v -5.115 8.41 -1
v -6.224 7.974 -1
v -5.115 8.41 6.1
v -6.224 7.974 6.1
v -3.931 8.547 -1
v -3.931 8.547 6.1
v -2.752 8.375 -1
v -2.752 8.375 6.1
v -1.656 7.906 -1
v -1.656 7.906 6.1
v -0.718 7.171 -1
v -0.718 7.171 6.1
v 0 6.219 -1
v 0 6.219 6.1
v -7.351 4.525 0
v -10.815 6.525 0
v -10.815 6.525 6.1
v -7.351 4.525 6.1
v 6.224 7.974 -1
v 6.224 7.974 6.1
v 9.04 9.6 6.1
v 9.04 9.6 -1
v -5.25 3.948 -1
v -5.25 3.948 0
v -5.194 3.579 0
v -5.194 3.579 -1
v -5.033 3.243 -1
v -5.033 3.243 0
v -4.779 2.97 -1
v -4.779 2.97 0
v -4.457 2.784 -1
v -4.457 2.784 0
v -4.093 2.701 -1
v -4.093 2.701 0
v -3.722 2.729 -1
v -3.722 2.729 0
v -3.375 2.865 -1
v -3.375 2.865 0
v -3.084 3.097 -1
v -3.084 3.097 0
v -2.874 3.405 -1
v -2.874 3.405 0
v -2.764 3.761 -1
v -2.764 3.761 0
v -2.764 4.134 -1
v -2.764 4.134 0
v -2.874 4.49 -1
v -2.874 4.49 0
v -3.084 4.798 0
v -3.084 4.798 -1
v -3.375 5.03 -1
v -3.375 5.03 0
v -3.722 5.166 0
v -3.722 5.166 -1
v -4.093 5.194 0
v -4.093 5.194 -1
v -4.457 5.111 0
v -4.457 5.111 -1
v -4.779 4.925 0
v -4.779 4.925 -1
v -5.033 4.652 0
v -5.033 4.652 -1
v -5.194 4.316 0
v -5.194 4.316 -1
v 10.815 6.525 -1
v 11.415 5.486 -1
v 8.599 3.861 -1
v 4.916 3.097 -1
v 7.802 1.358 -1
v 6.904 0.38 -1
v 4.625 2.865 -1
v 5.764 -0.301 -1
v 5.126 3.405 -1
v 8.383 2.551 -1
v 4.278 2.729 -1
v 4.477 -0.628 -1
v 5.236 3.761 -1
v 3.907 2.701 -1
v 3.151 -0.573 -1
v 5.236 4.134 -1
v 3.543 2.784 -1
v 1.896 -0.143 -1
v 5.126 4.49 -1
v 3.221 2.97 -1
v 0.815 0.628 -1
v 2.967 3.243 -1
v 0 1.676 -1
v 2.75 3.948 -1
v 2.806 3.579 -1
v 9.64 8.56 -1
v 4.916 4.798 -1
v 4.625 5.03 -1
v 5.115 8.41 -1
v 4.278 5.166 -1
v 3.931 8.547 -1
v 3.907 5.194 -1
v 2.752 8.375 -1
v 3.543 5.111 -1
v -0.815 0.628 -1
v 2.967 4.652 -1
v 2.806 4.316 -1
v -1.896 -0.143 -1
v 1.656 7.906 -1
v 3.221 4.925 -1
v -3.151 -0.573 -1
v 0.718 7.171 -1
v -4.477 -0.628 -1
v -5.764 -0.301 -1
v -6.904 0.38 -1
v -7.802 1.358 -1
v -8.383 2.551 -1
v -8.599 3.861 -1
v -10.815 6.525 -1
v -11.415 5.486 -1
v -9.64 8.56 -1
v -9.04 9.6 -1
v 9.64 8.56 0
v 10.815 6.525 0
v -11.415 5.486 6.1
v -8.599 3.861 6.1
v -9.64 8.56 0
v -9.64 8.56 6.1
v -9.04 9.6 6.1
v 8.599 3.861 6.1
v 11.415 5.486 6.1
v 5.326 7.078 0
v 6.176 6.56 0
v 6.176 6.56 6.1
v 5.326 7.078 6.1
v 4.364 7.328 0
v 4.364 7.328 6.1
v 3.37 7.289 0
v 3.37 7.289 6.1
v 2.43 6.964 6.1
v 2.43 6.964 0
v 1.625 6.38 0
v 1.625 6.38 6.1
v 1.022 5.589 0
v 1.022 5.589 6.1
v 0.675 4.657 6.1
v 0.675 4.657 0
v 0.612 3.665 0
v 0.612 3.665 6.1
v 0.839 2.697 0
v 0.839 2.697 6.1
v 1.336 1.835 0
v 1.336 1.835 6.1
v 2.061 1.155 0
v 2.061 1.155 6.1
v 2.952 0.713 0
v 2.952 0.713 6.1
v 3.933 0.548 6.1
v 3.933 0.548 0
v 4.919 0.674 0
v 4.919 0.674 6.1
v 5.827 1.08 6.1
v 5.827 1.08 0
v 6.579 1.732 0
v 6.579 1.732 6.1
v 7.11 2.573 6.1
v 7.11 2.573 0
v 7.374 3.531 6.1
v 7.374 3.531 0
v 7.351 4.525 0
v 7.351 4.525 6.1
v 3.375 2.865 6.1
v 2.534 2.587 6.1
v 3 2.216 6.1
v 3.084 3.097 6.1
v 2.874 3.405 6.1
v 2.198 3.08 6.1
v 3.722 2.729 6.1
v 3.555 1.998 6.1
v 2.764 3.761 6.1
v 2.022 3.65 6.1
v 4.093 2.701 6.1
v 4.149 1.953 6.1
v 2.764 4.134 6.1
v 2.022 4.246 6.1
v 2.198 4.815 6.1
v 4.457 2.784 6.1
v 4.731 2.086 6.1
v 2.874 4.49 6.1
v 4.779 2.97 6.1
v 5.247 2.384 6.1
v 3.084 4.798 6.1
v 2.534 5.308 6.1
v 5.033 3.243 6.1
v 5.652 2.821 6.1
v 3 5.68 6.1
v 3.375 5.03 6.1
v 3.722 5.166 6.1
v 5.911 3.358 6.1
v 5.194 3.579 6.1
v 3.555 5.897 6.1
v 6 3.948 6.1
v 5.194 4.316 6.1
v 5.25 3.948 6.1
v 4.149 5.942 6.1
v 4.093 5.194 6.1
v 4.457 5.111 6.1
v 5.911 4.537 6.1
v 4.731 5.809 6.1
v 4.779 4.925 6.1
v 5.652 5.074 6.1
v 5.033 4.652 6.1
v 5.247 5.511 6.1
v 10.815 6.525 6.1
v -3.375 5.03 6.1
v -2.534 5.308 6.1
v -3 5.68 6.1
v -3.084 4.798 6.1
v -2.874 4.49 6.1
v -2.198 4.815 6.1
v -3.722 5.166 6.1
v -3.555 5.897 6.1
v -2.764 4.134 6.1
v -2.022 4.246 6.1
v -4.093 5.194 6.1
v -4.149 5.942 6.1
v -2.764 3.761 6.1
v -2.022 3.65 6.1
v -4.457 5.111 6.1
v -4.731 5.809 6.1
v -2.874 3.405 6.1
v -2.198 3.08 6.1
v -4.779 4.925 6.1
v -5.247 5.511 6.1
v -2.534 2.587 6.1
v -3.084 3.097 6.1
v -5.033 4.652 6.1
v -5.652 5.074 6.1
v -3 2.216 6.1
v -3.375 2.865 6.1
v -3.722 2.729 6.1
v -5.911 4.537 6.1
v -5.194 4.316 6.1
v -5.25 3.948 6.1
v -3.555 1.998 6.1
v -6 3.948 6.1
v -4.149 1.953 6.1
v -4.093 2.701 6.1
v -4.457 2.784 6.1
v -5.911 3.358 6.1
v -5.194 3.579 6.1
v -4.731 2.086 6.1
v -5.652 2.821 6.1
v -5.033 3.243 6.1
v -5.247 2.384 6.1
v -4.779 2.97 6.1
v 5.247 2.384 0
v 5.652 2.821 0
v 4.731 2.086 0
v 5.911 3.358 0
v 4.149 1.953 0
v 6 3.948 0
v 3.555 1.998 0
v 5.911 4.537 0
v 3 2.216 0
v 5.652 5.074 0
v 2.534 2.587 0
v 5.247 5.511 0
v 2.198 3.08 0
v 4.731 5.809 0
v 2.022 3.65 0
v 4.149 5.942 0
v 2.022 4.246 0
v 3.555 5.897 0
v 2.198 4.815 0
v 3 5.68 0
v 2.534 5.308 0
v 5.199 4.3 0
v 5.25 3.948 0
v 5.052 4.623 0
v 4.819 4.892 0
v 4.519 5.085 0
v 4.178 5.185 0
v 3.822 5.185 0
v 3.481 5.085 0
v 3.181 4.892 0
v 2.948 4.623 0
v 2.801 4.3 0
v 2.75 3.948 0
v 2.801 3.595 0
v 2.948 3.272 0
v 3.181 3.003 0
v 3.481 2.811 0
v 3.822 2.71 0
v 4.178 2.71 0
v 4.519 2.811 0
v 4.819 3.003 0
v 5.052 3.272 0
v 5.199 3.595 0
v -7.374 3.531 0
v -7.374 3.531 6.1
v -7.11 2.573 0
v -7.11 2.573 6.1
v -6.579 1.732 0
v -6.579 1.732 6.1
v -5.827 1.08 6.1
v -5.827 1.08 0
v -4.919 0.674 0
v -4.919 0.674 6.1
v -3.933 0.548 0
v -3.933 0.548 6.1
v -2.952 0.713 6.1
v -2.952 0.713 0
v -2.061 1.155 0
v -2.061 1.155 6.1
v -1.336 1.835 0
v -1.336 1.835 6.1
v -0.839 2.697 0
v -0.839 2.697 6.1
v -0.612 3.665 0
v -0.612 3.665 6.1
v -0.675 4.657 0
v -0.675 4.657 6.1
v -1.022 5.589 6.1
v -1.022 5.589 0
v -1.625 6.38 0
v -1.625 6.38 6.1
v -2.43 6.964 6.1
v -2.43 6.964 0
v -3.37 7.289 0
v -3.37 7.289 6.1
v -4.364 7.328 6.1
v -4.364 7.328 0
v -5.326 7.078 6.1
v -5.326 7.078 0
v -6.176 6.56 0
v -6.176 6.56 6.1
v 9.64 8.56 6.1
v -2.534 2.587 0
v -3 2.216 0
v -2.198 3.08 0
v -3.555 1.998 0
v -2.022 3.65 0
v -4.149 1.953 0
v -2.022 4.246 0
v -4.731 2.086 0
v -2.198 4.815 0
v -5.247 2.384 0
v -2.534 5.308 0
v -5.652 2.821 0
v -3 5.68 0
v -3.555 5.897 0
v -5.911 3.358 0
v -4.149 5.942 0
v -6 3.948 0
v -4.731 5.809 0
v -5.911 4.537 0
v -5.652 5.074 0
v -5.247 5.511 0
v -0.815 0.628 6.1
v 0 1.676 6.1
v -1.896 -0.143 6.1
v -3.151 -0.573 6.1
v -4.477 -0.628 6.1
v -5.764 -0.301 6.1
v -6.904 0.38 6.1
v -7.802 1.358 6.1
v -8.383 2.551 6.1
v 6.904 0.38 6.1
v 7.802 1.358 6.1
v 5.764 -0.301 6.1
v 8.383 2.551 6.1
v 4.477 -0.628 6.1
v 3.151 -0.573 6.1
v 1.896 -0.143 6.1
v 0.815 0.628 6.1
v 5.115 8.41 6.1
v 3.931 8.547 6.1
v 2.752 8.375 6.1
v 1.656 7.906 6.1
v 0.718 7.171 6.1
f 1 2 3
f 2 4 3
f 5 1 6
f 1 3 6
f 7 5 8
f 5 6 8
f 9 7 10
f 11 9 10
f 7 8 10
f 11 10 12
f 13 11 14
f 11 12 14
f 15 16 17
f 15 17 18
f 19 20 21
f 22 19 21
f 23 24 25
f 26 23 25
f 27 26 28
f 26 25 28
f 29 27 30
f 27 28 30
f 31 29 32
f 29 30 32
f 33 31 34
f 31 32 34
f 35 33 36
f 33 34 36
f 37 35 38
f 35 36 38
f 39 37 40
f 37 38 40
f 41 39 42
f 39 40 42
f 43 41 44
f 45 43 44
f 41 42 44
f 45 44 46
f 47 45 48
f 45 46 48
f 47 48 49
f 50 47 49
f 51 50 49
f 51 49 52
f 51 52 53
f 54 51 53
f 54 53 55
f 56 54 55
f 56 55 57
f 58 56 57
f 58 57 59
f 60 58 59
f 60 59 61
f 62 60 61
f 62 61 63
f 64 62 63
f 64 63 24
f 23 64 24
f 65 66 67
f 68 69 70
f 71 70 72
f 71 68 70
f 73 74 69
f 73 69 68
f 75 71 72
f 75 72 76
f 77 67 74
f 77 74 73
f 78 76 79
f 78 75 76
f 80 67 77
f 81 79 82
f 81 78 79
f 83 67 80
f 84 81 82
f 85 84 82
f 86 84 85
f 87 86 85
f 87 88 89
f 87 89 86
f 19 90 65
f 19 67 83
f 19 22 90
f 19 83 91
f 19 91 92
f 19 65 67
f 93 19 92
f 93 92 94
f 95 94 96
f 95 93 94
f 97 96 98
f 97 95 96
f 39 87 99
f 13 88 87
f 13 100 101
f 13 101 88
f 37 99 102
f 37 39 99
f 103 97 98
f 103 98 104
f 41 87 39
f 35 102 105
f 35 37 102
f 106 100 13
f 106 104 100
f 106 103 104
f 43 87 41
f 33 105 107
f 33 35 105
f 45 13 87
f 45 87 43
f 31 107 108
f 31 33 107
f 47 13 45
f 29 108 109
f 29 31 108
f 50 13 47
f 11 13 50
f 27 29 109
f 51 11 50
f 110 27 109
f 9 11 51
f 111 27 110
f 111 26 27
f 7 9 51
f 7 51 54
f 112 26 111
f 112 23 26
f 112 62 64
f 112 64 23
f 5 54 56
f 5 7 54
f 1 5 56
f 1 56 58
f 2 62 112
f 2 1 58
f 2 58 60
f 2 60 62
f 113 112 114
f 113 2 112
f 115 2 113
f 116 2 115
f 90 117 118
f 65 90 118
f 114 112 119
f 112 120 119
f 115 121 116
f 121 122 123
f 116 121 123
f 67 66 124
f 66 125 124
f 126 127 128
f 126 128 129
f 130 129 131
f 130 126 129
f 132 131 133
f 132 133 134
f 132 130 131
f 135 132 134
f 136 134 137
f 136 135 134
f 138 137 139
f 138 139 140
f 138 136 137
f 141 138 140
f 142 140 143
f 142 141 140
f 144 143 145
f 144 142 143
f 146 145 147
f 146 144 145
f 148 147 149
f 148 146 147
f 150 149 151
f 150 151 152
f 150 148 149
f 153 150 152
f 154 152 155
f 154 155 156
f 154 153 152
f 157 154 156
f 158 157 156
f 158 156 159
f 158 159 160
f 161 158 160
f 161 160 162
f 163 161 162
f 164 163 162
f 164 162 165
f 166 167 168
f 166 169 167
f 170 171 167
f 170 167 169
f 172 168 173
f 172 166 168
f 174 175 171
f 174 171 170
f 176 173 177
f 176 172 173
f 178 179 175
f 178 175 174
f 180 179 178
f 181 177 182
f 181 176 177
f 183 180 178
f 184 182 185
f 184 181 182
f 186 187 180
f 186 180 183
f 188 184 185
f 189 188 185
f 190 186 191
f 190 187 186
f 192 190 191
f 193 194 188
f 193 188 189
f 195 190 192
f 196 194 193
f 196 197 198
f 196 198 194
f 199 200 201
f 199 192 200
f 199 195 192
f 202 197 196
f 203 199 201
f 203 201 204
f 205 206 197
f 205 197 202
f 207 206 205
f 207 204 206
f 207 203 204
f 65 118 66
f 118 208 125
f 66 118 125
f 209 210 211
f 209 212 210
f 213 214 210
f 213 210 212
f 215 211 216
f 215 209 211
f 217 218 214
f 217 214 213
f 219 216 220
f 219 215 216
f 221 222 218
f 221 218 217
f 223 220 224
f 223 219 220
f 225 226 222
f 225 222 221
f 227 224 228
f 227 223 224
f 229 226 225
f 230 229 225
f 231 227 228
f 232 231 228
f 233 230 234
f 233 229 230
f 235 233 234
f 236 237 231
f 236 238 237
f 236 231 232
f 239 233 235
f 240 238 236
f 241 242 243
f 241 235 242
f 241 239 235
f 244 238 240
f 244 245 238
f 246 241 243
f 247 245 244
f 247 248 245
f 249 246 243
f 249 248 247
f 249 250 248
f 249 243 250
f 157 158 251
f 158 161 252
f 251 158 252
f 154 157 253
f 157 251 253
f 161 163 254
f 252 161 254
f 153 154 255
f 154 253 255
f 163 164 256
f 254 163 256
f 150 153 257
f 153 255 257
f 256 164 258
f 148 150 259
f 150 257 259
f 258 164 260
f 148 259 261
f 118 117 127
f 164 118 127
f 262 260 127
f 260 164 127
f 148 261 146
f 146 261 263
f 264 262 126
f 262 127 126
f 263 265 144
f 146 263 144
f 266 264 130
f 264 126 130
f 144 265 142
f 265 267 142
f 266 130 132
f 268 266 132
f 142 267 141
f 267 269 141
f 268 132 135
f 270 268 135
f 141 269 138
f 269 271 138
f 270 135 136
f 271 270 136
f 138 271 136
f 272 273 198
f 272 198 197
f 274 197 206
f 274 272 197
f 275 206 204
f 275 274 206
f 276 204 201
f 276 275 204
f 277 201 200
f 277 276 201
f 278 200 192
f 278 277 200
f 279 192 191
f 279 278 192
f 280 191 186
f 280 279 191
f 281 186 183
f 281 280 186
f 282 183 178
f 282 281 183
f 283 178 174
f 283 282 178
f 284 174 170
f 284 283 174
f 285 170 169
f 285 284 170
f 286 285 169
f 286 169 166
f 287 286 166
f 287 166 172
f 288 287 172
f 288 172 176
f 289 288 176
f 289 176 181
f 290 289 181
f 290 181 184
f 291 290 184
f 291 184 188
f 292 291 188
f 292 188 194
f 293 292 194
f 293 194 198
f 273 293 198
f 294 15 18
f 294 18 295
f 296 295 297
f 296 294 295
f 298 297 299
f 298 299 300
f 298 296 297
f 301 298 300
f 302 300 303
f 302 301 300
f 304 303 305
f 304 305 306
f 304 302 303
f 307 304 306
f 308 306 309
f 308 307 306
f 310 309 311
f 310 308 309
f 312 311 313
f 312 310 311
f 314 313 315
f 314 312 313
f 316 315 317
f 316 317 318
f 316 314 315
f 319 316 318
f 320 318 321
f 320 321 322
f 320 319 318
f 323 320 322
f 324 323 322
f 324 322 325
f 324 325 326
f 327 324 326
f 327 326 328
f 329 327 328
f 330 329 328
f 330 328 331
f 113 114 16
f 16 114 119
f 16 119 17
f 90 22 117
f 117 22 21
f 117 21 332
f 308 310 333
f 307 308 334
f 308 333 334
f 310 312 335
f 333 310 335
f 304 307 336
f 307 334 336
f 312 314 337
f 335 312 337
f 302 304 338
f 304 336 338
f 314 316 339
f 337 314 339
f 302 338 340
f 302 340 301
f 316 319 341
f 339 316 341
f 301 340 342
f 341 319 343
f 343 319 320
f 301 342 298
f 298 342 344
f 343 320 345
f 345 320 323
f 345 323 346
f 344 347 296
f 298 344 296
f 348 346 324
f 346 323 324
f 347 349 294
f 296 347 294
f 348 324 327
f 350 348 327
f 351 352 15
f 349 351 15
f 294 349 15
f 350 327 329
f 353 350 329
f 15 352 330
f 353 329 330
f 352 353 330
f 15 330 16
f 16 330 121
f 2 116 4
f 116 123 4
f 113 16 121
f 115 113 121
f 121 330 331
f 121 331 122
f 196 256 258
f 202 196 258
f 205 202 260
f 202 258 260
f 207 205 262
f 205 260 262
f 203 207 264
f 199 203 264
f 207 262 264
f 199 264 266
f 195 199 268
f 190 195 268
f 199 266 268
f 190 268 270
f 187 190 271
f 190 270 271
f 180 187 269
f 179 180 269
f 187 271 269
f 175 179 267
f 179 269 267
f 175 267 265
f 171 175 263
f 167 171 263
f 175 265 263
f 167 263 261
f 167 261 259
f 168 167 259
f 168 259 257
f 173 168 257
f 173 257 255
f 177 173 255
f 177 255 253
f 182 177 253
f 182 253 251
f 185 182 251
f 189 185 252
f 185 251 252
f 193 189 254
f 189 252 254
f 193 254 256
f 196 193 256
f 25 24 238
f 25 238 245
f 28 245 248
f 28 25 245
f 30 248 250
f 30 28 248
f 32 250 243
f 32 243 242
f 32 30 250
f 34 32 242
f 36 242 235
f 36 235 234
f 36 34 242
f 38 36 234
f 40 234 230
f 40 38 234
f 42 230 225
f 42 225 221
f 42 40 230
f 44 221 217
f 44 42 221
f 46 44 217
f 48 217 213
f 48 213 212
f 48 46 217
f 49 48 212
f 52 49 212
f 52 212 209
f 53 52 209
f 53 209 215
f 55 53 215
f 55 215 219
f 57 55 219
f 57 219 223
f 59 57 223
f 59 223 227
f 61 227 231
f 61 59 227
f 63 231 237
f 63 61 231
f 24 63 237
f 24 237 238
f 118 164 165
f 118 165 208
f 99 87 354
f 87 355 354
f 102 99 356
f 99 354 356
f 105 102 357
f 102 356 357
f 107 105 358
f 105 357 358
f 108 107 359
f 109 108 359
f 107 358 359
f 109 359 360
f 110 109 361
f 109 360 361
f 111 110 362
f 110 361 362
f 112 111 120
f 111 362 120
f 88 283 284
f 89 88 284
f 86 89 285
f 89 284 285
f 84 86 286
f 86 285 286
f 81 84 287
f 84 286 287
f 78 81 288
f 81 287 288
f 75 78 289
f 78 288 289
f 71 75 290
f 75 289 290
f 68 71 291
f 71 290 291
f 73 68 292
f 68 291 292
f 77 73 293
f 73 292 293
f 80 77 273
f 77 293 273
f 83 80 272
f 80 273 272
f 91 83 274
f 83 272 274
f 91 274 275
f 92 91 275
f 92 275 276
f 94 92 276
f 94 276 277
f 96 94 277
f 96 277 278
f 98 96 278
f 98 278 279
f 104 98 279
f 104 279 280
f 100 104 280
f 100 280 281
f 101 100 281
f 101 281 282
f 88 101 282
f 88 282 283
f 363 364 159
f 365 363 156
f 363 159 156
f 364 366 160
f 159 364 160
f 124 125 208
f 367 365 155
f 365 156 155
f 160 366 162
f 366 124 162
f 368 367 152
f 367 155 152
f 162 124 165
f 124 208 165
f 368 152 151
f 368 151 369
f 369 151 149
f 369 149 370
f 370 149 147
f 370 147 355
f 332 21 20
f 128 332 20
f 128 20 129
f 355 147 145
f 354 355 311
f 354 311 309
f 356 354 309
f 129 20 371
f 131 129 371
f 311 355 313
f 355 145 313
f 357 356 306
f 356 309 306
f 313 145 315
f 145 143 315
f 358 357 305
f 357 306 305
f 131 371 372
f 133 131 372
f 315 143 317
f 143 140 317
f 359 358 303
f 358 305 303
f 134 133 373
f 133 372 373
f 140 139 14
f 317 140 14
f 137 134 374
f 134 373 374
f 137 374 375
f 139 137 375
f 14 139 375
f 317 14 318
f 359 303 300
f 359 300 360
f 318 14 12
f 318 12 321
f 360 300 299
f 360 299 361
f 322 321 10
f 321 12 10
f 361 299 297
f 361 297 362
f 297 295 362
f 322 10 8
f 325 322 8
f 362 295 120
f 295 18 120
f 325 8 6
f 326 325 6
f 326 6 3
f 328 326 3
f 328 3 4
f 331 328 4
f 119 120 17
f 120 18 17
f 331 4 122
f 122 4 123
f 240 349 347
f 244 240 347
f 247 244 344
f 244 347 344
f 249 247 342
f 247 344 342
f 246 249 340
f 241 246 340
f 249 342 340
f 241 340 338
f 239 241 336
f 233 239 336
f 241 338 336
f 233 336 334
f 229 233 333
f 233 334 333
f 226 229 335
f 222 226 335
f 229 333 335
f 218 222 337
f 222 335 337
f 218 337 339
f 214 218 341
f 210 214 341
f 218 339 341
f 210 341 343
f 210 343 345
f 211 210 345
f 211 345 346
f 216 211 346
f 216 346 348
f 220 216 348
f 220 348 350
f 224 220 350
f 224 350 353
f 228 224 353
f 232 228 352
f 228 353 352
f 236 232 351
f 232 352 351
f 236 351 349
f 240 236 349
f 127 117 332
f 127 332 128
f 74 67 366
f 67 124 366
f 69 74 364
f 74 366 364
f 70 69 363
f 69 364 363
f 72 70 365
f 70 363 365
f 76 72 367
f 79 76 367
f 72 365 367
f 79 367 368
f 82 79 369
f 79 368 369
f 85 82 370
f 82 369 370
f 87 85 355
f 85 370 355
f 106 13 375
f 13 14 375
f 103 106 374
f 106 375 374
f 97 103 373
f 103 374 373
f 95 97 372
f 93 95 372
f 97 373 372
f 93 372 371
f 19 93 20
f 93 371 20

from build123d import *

# Parameters (mm, degrees)
SKETCH1_R             = 2
SKETCH1_R_2           = 1.25
BOSS_EXTRUDE1_DEPTH   = 6.1
BOSS_EXTRUDE1_2_DEPTH = 6.1
BOSS_EXTRUDE1_3_DEPTH = 6.1
BOSS_EXTRUDE2_DEPTH   = 1
CUT_EXTRUDE1_REACH    = 18.114
SKETCH6_R             = 1.25


with BuildPart() as part:
    # Sketch1 → Boss-Extrude1 (new body)
    with BuildSketch(Plane.XY):
        with Locations((4, 3.947606604)):
            Circle(SKETCH1_R)
        with Locations((4, 3.947606604)):
            Circle(SKETCH1_R_2, mode=Mode.SUBTRACT)
    extrude(amount=BOSS_EXTRUDE1_DEPTH)



with BuildPart() as body_2:
    # Sketch1 → Boss-Extrude1 2 (new body)
    with BuildSketch(Plane.XY):
        with Locations(Location((-4, 3.947606604, 0), (0, 0, 180))):
            Circle(SKETCH1_R)
        with Locations(Location((-4, 3.947606604, 0), (0, 0, 180))):
            Circle(SKETCH1_R_2, mode=Mode.SUBTRACT)
    extrude(amount=BOSS_EXTRUDE1_2_DEPTH)


with BuildPart() as body_3:
    # Sketch1 → Boss-Extrude1 3 (new body)
    with BuildSketch(Plane.XY):
        with BuildLine():
            Line((7.350565553, 4.525283395), (10.814667168, 6.525283395))
            Line((10.814667168, 6.525283395), (11.414667168, 5.486052911))
            Line((11.414667168, 5.486052911), (8.599175725, 3.860528168))
            ThreePointArc((8.599175725, 3.860528168), (5.132583975, -0.510784758), (0, 1.676043266))
            ThreePointArc((0, 1.676043266), (-5.132583975, -0.510784758), (-8.599175725, 3.860528168))
            Line((-8.599175725, 3.860528168), (-11.414667168, 5.486052911))
            Line((-11.414667168, 5.486052911), (-10.814667168, 6.525283395))
            Line((-10.814667168, 6.525283395), (-7.350565553, 4.525283395))
            ThreePointArc((-7.350565553, 4.525283395), (-1.055513627, 2.247606604), (-6.175565553, 6.560443094))
            Line((-6.175565553, 6.560443094), (-9.639667168, 8.560443094))
            Line((-9.639667168, 8.560443094), (-9.039667168, 9.599673579))
            Line((-9.039667168, 9.599673579), (-6.224175725, 7.974148836))
            ThreePointArc((-6.224175725, 7.974148836), (-2.751650813, 8.374978771), (0, 6.219169942))
            ThreePointArc((0, 6.219169942), (2.751650813, 8.374978771), (6.224175725, 7.974148836))
            Line((6.224175725, 7.974148836), (9.039667168, 9.599673579))
            Line((9.039667168, 9.599673579), (9.639667168, 8.560443094))
            Line((9.639667168, 8.560443094), (6.175565553, 6.560443094))
            ThreePointArc((6.175565553, 6.560443094), (1.055513627, 2.247606604), (7.350565553, 4.525283395))
        make_face()
    extrude(amount=BOSS_EXTRUDE1_3_DEPTH)


with BuildPart() as part_1:
    add(part.part)

    add(body_2.part)  # Boss-Extrude2 merges body 2

    add(body_3.part)  # Boss-Extrude2 merges body 3
    # Sketch2 → Boss-Extrude2 (add)
    with BuildSketch(Plane(origin=(0, 0, 0), x_dir=(-1, 0, 0), z_dir=(0, 0, -1))):
        with BuildLine():
            Line((-9.639667168, 8.560443094), (-10.814667168, 6.525283395))
            Line((-10.814667168, 6.525283395), (-11.414667168, 5.486052911))
            Line((-11.414667168, 5.486052911), (-8.599175725, 3.860528168))
            ThreePointArc((-8.599175725, 3.860528168), (-5.132583975, -0.510784758), (0, 1.676043266))
            ThreePointArc((0, 1.676043266), (5.132583975, -0.510784758), (8.599175725, 3.860528168))
            Line((8.599175725, 3.860528168), (11.414667168, 5.486052911))
            Line((11.414667168, 5.486052911), (10.814667168, 6.525283395))
            Line((10.814667168, 6.525283395), (9.639667168, 8.560443094))
            Line((9.639667168, 8.560443094), (9.039667168, 9.599673579))
            Line((9.039667168, 9.599673579), (6.224175725, 7.974148836))
            ThreePointArc((6.224175725, 7.974148836), (2.751650813, 8.374978771), (0, 6.219169942))
            ThreePointArc((0, 6.219169942), (-2.751650813, 8.374978771), (-6.224175725, 7.974148836))
            Line((-6.224175725, 7.974148836), (-9.039667168, 9.599673579))
            Line((-9.039667168, 9.599673579), (-9.639667168, 8.560443094))
        make_face()
    extrude(amount=BOSS_EXTRUDE2_DEPTH)

    # Sketch6 → Cut-Extrude1 (cut, up to next)
    with BuildSketch(Plane.XY, mode=Mode.PRIVATE) as cut_extrude1_sk1:
        with Locations(Location((4, 3.947606604, 0), (0, 0, 180))):
            Circle(SKETCH6_R)
    cut_extrude1_tool1 = extrude(cut_extrude1_sk1.sketch, amount=-CUT_EXTRUDE1_REACH, mode=Mode.PRIVATE) & part_1.part
    # Sketch6 → Cut-Extrude1 (cut, up to next)
    with BuildSketch(Plane.XY, mode=Mode.PRIVATE) as cut_extrude1_sk2:
        with Locations(Location((-4, 3.947606604, 0), (0, 0, 180))):
            Circle(SKETCH6_R)
    cut_extrude1_tool2 = extrude(cut_extrude1_sk2.sketch, amount=-CUT_EXTRUDE1_REACH, mode=Mode.PRIVATE) & part_1.part
    add(cut_extrude1_tool1.solids().sort_by_distance((4, 3.947607, 0))[0], mode=Mode.SUBTRACT)
    add(cut_extrude1_tool2.solids().sort_by_distance((-4, 3.947607, 0))[0], mode=Mode.SUBTRACT)


solid = part_1.part
